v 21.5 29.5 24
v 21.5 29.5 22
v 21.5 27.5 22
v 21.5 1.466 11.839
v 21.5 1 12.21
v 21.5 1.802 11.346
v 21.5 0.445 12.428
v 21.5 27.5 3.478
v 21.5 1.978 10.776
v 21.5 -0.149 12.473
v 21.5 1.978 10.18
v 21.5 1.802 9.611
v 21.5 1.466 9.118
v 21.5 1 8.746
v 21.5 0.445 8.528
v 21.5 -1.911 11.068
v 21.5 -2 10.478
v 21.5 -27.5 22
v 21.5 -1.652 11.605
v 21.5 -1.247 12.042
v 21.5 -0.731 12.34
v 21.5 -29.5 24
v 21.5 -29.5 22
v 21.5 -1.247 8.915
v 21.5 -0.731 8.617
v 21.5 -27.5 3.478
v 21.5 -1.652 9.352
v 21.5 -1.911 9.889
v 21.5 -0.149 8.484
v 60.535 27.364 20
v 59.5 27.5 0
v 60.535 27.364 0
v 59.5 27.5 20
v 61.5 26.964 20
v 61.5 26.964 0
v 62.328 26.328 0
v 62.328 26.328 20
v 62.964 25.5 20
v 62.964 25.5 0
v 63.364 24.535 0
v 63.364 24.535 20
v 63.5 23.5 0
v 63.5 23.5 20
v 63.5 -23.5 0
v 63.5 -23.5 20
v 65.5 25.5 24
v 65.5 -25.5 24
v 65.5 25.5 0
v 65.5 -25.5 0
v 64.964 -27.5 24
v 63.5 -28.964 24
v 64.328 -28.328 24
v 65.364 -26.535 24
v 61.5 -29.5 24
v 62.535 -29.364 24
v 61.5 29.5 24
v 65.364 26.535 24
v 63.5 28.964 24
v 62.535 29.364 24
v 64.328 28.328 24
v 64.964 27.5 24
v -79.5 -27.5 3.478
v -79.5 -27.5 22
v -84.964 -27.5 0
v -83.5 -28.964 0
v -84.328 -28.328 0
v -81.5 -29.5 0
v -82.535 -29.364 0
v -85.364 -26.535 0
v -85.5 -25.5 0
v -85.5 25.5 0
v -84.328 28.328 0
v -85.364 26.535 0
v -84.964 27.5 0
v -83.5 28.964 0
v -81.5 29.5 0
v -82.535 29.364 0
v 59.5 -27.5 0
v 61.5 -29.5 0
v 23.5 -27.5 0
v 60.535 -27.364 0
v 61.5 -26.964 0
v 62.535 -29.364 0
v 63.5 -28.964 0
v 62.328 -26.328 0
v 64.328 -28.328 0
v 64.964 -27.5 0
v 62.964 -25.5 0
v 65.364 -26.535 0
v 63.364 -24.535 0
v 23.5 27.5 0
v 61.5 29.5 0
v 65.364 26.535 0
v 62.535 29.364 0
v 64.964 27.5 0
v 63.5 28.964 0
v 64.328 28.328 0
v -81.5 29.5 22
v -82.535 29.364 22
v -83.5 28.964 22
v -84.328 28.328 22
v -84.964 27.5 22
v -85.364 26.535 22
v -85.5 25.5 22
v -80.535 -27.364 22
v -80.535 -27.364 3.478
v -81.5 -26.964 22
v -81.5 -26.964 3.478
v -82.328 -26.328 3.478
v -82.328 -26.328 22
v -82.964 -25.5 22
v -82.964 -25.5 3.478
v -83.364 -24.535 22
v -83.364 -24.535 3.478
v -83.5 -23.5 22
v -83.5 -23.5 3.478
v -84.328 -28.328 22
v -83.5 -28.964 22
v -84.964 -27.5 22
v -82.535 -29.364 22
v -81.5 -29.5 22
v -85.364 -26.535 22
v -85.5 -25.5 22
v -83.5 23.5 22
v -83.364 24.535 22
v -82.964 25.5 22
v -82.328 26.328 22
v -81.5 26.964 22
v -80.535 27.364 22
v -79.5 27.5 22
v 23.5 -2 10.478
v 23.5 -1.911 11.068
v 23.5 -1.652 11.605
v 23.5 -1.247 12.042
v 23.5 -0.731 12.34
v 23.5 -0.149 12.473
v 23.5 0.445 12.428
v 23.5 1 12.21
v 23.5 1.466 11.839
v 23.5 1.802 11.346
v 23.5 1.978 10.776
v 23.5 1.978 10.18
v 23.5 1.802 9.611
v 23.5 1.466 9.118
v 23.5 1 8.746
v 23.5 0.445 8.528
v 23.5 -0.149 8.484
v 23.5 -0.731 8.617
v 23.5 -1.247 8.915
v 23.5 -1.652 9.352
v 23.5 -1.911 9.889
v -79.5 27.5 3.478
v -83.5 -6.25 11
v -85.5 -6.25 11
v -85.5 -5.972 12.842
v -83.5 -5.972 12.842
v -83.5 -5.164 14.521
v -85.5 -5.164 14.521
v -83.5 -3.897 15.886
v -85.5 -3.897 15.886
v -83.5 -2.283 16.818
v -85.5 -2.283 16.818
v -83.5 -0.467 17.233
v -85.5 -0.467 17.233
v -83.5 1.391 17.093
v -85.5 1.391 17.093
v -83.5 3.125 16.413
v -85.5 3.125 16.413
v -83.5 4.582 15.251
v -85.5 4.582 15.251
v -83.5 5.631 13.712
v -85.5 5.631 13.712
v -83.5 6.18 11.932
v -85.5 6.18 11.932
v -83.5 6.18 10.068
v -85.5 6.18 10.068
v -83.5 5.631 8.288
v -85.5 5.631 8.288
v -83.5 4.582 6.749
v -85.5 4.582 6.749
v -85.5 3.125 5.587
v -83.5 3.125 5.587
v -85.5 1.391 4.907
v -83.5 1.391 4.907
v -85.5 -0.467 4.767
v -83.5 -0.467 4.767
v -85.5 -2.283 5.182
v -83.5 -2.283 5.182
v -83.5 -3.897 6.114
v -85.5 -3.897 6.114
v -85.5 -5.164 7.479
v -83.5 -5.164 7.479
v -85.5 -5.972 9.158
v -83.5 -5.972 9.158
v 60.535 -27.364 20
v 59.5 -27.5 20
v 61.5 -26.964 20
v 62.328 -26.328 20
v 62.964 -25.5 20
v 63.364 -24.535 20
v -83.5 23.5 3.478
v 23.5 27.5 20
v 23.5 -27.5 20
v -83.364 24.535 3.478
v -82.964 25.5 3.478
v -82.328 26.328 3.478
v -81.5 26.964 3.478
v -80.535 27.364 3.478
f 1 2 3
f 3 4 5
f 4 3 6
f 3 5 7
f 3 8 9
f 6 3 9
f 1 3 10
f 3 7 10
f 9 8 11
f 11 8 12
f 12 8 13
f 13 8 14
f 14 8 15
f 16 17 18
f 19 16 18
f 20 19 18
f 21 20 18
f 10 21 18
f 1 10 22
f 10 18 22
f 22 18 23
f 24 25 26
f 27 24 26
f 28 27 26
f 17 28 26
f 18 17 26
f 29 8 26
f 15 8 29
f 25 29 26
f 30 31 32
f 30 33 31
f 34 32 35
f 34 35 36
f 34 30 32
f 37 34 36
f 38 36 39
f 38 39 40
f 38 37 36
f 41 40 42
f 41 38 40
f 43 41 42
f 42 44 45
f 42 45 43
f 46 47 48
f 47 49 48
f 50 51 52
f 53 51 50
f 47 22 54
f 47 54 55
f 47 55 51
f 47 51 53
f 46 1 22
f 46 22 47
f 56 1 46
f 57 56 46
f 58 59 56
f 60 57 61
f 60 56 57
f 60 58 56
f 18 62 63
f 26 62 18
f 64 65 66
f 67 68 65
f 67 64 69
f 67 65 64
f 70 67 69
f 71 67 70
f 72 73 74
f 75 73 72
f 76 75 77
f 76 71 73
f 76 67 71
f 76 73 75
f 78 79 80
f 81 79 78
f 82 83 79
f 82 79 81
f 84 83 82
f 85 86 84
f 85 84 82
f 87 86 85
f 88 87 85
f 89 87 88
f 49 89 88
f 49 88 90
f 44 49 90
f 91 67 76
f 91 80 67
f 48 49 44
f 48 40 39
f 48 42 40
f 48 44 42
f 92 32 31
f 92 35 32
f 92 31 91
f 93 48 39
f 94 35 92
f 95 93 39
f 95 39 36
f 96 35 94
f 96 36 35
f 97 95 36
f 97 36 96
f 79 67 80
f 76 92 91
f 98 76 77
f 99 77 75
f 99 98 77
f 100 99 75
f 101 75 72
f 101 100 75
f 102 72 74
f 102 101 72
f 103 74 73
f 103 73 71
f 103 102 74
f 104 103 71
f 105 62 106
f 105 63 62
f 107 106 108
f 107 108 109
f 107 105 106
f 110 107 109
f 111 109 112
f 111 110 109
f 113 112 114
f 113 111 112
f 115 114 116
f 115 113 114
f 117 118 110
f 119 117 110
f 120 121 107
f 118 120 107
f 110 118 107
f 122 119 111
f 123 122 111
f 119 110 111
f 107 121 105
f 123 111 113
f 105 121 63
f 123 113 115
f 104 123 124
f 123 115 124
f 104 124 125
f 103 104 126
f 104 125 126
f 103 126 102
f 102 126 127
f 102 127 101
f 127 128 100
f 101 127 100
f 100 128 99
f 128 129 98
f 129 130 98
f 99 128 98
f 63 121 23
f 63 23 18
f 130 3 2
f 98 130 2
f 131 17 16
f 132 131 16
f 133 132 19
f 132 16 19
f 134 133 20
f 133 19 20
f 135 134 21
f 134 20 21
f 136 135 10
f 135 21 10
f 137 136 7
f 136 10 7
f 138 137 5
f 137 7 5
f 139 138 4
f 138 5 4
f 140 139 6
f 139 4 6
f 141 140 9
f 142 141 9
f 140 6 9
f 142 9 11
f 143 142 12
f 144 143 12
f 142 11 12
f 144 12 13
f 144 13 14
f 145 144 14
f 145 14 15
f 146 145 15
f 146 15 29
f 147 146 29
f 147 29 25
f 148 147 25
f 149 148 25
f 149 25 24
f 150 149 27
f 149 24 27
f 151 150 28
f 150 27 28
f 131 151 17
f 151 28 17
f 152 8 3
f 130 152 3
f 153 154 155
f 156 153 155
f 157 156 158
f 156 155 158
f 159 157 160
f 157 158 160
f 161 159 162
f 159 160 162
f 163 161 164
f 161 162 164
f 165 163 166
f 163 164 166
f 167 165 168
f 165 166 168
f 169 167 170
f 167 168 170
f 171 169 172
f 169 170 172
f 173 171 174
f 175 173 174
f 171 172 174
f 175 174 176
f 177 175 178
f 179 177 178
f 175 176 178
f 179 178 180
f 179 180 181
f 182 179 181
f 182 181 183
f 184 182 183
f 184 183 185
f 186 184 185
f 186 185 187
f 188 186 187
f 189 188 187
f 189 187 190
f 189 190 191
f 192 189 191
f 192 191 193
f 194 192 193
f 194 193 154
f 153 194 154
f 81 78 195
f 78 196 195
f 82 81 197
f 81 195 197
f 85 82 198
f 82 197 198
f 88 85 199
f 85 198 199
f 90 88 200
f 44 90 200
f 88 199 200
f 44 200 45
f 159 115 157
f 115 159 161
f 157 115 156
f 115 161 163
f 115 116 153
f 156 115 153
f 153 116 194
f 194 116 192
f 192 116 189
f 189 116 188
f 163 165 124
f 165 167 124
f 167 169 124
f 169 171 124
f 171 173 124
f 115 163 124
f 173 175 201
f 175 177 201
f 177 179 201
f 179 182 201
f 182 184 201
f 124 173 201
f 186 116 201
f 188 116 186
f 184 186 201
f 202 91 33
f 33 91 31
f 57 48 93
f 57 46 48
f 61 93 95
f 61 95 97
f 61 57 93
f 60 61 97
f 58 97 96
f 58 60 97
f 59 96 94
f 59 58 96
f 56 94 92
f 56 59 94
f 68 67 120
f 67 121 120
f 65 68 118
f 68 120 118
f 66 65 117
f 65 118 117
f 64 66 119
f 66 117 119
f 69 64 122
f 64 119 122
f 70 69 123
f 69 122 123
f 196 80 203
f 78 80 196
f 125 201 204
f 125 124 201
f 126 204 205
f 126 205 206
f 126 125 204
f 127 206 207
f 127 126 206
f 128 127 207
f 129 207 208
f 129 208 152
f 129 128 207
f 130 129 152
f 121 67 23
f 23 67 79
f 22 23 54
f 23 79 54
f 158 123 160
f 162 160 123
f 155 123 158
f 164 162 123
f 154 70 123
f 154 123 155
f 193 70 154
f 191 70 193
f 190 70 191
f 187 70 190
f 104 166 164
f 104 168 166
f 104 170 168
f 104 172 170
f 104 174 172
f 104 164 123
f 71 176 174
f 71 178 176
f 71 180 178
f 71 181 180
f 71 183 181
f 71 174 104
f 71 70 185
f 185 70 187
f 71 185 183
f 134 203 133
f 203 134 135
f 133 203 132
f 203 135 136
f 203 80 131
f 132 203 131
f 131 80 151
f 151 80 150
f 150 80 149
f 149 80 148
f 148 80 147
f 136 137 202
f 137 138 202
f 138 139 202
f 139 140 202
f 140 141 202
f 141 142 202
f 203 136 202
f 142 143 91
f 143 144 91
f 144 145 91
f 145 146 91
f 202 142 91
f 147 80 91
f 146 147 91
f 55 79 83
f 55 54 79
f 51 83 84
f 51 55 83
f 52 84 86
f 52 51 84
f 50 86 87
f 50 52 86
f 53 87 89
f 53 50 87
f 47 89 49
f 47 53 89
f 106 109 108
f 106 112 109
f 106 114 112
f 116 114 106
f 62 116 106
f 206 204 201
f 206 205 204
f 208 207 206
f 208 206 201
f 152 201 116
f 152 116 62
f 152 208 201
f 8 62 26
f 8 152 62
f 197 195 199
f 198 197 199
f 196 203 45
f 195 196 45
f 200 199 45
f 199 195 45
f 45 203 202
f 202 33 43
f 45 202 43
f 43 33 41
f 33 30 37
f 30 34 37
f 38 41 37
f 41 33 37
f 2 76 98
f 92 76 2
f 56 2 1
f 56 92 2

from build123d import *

# Parameters (mm, degrees)
F0_W      = 131
F0_H      = 59
F0_W_2    = 85
F0_H_2    = 55
F0_W_3    = 40
F1_DEPTH  = 22
F2_W      = 40
F2_H      = 2
F3_DEPTH  = 55
F4_W      = 85
F4_H      = 3.4782900475
F5_DEPTH  = 55
F7_DEPTH  = 2
F8_R      = 2
F9_DEPTH  = 2
F10_R     = 4
F11_DEPTH = 20
F12_DEPTH = 20
F13_R     = 4
F14_R     = 6.25
F15_DEPTH = 25


with BuildPart() as f1:
    # F0 (on Top) → F1 (new body)
    with BuildSketch(Plane.XY):
        Rectangle(F0_W, F0_H)
        with Locations((-21, 0)):
            Rectangle(F0_W_2, F0_H_2, mode=Mode.SUBTRACT)
        with Locations((43.5, 0)):
            Rectangle(F0_W_3, F0_H_2, mode=Mode.SUBTRACT)
    extrude(amount=F1_DEPTH)

    # F2 (on face) → F3 (join)
    with BuildSketch(Plane.XZ.offset(-27.5)):
        with Locations((43.5, 21)):
            Rectangle(F2_W, F2_H)
    extrude(amount=F3_DEPTH)

    # F4 (on face) → F5 (join)
    with BuildSketch(Plane.XZ.offset(-27.5)):
        with Locations((-21, 1.7391450237)):
            Rectangle(F4_W, F4_H)
    extrude(amount=F5_DEPTH)

    # F6 (on face) → F7 (join)
    with BuildSketch(Plane.XY.offset(22)):
        Polygon((21.5, -29.5), (65.5, -29.5), (65.5, 29.5), (21.5, 29.5), (21.5, 27.5), (21.5, -27.5), align=None)
    extrude(amount=F7_DEPTH)

    # F8 (on face) → F9 (cut)
    with BuildSketch(Plane(origin=(21.5, 0, 0), x_dir=(0, -1, 0), z_dir=(-1, 0, 0))):
        with Locations((0, 10.4782900475)):
            Circle(F8_R)
    extrude(amount=-F9_DEPTH, mode=Mode.SUBTRACT)

    # F10
    f10_edges = [f1.edges().sort_by_distance(p)[0] for p in [
        (65.5, -29.5, 12),
        (65.5, 29.5, 12),
        (63.5, -27.5, 10),
        (63.5, 27.5, 10),
    ]]
    fillet(f10_edges, radius=F10_R)

    # F11 (add): a face of the model
    f11_faces = [f1.faces().sort_by_distance(p)[0] for p in [
        (-65.5, 0, 11),
    ]]
    extrude(f11_faces, amount=F11_DEPTH)

    # F12 (cut): a face of the model
    f12_faces = [f1.faces().sort_by_distance(p)[0] for p in [
        (-63.5, 0, 12.7391450237),
    ]]
    extrude(f12_faces, amount=-F12_DEPTH, mode=Mode.SUBTRACT)

    # F13
    f13_edges = [f1.edges().sort_by_distance(p)[0] for p in [
        (-83.5, 27.5, 12.739145),
        (-85.5, -29.5, 11),
        (-83.5, -27.5, 12.739145),
        (-85.5, 29.5, 11),
    ]]
    fillet(f13_edges, radius=F13_R)

    # F14 (on face) → F15 (cut)
    with BuildSketch(Plane(origin=(-85.5, 0, 0), x_dir=(0, -1, 0), z_dir=(-1, 0, 0))):
        with Locations((0, 11)):
            Circle(F14_R)
    extrude(amount=-F15_DEPTH, mode=Mode.SUBTRACT)


solid = f1.part
